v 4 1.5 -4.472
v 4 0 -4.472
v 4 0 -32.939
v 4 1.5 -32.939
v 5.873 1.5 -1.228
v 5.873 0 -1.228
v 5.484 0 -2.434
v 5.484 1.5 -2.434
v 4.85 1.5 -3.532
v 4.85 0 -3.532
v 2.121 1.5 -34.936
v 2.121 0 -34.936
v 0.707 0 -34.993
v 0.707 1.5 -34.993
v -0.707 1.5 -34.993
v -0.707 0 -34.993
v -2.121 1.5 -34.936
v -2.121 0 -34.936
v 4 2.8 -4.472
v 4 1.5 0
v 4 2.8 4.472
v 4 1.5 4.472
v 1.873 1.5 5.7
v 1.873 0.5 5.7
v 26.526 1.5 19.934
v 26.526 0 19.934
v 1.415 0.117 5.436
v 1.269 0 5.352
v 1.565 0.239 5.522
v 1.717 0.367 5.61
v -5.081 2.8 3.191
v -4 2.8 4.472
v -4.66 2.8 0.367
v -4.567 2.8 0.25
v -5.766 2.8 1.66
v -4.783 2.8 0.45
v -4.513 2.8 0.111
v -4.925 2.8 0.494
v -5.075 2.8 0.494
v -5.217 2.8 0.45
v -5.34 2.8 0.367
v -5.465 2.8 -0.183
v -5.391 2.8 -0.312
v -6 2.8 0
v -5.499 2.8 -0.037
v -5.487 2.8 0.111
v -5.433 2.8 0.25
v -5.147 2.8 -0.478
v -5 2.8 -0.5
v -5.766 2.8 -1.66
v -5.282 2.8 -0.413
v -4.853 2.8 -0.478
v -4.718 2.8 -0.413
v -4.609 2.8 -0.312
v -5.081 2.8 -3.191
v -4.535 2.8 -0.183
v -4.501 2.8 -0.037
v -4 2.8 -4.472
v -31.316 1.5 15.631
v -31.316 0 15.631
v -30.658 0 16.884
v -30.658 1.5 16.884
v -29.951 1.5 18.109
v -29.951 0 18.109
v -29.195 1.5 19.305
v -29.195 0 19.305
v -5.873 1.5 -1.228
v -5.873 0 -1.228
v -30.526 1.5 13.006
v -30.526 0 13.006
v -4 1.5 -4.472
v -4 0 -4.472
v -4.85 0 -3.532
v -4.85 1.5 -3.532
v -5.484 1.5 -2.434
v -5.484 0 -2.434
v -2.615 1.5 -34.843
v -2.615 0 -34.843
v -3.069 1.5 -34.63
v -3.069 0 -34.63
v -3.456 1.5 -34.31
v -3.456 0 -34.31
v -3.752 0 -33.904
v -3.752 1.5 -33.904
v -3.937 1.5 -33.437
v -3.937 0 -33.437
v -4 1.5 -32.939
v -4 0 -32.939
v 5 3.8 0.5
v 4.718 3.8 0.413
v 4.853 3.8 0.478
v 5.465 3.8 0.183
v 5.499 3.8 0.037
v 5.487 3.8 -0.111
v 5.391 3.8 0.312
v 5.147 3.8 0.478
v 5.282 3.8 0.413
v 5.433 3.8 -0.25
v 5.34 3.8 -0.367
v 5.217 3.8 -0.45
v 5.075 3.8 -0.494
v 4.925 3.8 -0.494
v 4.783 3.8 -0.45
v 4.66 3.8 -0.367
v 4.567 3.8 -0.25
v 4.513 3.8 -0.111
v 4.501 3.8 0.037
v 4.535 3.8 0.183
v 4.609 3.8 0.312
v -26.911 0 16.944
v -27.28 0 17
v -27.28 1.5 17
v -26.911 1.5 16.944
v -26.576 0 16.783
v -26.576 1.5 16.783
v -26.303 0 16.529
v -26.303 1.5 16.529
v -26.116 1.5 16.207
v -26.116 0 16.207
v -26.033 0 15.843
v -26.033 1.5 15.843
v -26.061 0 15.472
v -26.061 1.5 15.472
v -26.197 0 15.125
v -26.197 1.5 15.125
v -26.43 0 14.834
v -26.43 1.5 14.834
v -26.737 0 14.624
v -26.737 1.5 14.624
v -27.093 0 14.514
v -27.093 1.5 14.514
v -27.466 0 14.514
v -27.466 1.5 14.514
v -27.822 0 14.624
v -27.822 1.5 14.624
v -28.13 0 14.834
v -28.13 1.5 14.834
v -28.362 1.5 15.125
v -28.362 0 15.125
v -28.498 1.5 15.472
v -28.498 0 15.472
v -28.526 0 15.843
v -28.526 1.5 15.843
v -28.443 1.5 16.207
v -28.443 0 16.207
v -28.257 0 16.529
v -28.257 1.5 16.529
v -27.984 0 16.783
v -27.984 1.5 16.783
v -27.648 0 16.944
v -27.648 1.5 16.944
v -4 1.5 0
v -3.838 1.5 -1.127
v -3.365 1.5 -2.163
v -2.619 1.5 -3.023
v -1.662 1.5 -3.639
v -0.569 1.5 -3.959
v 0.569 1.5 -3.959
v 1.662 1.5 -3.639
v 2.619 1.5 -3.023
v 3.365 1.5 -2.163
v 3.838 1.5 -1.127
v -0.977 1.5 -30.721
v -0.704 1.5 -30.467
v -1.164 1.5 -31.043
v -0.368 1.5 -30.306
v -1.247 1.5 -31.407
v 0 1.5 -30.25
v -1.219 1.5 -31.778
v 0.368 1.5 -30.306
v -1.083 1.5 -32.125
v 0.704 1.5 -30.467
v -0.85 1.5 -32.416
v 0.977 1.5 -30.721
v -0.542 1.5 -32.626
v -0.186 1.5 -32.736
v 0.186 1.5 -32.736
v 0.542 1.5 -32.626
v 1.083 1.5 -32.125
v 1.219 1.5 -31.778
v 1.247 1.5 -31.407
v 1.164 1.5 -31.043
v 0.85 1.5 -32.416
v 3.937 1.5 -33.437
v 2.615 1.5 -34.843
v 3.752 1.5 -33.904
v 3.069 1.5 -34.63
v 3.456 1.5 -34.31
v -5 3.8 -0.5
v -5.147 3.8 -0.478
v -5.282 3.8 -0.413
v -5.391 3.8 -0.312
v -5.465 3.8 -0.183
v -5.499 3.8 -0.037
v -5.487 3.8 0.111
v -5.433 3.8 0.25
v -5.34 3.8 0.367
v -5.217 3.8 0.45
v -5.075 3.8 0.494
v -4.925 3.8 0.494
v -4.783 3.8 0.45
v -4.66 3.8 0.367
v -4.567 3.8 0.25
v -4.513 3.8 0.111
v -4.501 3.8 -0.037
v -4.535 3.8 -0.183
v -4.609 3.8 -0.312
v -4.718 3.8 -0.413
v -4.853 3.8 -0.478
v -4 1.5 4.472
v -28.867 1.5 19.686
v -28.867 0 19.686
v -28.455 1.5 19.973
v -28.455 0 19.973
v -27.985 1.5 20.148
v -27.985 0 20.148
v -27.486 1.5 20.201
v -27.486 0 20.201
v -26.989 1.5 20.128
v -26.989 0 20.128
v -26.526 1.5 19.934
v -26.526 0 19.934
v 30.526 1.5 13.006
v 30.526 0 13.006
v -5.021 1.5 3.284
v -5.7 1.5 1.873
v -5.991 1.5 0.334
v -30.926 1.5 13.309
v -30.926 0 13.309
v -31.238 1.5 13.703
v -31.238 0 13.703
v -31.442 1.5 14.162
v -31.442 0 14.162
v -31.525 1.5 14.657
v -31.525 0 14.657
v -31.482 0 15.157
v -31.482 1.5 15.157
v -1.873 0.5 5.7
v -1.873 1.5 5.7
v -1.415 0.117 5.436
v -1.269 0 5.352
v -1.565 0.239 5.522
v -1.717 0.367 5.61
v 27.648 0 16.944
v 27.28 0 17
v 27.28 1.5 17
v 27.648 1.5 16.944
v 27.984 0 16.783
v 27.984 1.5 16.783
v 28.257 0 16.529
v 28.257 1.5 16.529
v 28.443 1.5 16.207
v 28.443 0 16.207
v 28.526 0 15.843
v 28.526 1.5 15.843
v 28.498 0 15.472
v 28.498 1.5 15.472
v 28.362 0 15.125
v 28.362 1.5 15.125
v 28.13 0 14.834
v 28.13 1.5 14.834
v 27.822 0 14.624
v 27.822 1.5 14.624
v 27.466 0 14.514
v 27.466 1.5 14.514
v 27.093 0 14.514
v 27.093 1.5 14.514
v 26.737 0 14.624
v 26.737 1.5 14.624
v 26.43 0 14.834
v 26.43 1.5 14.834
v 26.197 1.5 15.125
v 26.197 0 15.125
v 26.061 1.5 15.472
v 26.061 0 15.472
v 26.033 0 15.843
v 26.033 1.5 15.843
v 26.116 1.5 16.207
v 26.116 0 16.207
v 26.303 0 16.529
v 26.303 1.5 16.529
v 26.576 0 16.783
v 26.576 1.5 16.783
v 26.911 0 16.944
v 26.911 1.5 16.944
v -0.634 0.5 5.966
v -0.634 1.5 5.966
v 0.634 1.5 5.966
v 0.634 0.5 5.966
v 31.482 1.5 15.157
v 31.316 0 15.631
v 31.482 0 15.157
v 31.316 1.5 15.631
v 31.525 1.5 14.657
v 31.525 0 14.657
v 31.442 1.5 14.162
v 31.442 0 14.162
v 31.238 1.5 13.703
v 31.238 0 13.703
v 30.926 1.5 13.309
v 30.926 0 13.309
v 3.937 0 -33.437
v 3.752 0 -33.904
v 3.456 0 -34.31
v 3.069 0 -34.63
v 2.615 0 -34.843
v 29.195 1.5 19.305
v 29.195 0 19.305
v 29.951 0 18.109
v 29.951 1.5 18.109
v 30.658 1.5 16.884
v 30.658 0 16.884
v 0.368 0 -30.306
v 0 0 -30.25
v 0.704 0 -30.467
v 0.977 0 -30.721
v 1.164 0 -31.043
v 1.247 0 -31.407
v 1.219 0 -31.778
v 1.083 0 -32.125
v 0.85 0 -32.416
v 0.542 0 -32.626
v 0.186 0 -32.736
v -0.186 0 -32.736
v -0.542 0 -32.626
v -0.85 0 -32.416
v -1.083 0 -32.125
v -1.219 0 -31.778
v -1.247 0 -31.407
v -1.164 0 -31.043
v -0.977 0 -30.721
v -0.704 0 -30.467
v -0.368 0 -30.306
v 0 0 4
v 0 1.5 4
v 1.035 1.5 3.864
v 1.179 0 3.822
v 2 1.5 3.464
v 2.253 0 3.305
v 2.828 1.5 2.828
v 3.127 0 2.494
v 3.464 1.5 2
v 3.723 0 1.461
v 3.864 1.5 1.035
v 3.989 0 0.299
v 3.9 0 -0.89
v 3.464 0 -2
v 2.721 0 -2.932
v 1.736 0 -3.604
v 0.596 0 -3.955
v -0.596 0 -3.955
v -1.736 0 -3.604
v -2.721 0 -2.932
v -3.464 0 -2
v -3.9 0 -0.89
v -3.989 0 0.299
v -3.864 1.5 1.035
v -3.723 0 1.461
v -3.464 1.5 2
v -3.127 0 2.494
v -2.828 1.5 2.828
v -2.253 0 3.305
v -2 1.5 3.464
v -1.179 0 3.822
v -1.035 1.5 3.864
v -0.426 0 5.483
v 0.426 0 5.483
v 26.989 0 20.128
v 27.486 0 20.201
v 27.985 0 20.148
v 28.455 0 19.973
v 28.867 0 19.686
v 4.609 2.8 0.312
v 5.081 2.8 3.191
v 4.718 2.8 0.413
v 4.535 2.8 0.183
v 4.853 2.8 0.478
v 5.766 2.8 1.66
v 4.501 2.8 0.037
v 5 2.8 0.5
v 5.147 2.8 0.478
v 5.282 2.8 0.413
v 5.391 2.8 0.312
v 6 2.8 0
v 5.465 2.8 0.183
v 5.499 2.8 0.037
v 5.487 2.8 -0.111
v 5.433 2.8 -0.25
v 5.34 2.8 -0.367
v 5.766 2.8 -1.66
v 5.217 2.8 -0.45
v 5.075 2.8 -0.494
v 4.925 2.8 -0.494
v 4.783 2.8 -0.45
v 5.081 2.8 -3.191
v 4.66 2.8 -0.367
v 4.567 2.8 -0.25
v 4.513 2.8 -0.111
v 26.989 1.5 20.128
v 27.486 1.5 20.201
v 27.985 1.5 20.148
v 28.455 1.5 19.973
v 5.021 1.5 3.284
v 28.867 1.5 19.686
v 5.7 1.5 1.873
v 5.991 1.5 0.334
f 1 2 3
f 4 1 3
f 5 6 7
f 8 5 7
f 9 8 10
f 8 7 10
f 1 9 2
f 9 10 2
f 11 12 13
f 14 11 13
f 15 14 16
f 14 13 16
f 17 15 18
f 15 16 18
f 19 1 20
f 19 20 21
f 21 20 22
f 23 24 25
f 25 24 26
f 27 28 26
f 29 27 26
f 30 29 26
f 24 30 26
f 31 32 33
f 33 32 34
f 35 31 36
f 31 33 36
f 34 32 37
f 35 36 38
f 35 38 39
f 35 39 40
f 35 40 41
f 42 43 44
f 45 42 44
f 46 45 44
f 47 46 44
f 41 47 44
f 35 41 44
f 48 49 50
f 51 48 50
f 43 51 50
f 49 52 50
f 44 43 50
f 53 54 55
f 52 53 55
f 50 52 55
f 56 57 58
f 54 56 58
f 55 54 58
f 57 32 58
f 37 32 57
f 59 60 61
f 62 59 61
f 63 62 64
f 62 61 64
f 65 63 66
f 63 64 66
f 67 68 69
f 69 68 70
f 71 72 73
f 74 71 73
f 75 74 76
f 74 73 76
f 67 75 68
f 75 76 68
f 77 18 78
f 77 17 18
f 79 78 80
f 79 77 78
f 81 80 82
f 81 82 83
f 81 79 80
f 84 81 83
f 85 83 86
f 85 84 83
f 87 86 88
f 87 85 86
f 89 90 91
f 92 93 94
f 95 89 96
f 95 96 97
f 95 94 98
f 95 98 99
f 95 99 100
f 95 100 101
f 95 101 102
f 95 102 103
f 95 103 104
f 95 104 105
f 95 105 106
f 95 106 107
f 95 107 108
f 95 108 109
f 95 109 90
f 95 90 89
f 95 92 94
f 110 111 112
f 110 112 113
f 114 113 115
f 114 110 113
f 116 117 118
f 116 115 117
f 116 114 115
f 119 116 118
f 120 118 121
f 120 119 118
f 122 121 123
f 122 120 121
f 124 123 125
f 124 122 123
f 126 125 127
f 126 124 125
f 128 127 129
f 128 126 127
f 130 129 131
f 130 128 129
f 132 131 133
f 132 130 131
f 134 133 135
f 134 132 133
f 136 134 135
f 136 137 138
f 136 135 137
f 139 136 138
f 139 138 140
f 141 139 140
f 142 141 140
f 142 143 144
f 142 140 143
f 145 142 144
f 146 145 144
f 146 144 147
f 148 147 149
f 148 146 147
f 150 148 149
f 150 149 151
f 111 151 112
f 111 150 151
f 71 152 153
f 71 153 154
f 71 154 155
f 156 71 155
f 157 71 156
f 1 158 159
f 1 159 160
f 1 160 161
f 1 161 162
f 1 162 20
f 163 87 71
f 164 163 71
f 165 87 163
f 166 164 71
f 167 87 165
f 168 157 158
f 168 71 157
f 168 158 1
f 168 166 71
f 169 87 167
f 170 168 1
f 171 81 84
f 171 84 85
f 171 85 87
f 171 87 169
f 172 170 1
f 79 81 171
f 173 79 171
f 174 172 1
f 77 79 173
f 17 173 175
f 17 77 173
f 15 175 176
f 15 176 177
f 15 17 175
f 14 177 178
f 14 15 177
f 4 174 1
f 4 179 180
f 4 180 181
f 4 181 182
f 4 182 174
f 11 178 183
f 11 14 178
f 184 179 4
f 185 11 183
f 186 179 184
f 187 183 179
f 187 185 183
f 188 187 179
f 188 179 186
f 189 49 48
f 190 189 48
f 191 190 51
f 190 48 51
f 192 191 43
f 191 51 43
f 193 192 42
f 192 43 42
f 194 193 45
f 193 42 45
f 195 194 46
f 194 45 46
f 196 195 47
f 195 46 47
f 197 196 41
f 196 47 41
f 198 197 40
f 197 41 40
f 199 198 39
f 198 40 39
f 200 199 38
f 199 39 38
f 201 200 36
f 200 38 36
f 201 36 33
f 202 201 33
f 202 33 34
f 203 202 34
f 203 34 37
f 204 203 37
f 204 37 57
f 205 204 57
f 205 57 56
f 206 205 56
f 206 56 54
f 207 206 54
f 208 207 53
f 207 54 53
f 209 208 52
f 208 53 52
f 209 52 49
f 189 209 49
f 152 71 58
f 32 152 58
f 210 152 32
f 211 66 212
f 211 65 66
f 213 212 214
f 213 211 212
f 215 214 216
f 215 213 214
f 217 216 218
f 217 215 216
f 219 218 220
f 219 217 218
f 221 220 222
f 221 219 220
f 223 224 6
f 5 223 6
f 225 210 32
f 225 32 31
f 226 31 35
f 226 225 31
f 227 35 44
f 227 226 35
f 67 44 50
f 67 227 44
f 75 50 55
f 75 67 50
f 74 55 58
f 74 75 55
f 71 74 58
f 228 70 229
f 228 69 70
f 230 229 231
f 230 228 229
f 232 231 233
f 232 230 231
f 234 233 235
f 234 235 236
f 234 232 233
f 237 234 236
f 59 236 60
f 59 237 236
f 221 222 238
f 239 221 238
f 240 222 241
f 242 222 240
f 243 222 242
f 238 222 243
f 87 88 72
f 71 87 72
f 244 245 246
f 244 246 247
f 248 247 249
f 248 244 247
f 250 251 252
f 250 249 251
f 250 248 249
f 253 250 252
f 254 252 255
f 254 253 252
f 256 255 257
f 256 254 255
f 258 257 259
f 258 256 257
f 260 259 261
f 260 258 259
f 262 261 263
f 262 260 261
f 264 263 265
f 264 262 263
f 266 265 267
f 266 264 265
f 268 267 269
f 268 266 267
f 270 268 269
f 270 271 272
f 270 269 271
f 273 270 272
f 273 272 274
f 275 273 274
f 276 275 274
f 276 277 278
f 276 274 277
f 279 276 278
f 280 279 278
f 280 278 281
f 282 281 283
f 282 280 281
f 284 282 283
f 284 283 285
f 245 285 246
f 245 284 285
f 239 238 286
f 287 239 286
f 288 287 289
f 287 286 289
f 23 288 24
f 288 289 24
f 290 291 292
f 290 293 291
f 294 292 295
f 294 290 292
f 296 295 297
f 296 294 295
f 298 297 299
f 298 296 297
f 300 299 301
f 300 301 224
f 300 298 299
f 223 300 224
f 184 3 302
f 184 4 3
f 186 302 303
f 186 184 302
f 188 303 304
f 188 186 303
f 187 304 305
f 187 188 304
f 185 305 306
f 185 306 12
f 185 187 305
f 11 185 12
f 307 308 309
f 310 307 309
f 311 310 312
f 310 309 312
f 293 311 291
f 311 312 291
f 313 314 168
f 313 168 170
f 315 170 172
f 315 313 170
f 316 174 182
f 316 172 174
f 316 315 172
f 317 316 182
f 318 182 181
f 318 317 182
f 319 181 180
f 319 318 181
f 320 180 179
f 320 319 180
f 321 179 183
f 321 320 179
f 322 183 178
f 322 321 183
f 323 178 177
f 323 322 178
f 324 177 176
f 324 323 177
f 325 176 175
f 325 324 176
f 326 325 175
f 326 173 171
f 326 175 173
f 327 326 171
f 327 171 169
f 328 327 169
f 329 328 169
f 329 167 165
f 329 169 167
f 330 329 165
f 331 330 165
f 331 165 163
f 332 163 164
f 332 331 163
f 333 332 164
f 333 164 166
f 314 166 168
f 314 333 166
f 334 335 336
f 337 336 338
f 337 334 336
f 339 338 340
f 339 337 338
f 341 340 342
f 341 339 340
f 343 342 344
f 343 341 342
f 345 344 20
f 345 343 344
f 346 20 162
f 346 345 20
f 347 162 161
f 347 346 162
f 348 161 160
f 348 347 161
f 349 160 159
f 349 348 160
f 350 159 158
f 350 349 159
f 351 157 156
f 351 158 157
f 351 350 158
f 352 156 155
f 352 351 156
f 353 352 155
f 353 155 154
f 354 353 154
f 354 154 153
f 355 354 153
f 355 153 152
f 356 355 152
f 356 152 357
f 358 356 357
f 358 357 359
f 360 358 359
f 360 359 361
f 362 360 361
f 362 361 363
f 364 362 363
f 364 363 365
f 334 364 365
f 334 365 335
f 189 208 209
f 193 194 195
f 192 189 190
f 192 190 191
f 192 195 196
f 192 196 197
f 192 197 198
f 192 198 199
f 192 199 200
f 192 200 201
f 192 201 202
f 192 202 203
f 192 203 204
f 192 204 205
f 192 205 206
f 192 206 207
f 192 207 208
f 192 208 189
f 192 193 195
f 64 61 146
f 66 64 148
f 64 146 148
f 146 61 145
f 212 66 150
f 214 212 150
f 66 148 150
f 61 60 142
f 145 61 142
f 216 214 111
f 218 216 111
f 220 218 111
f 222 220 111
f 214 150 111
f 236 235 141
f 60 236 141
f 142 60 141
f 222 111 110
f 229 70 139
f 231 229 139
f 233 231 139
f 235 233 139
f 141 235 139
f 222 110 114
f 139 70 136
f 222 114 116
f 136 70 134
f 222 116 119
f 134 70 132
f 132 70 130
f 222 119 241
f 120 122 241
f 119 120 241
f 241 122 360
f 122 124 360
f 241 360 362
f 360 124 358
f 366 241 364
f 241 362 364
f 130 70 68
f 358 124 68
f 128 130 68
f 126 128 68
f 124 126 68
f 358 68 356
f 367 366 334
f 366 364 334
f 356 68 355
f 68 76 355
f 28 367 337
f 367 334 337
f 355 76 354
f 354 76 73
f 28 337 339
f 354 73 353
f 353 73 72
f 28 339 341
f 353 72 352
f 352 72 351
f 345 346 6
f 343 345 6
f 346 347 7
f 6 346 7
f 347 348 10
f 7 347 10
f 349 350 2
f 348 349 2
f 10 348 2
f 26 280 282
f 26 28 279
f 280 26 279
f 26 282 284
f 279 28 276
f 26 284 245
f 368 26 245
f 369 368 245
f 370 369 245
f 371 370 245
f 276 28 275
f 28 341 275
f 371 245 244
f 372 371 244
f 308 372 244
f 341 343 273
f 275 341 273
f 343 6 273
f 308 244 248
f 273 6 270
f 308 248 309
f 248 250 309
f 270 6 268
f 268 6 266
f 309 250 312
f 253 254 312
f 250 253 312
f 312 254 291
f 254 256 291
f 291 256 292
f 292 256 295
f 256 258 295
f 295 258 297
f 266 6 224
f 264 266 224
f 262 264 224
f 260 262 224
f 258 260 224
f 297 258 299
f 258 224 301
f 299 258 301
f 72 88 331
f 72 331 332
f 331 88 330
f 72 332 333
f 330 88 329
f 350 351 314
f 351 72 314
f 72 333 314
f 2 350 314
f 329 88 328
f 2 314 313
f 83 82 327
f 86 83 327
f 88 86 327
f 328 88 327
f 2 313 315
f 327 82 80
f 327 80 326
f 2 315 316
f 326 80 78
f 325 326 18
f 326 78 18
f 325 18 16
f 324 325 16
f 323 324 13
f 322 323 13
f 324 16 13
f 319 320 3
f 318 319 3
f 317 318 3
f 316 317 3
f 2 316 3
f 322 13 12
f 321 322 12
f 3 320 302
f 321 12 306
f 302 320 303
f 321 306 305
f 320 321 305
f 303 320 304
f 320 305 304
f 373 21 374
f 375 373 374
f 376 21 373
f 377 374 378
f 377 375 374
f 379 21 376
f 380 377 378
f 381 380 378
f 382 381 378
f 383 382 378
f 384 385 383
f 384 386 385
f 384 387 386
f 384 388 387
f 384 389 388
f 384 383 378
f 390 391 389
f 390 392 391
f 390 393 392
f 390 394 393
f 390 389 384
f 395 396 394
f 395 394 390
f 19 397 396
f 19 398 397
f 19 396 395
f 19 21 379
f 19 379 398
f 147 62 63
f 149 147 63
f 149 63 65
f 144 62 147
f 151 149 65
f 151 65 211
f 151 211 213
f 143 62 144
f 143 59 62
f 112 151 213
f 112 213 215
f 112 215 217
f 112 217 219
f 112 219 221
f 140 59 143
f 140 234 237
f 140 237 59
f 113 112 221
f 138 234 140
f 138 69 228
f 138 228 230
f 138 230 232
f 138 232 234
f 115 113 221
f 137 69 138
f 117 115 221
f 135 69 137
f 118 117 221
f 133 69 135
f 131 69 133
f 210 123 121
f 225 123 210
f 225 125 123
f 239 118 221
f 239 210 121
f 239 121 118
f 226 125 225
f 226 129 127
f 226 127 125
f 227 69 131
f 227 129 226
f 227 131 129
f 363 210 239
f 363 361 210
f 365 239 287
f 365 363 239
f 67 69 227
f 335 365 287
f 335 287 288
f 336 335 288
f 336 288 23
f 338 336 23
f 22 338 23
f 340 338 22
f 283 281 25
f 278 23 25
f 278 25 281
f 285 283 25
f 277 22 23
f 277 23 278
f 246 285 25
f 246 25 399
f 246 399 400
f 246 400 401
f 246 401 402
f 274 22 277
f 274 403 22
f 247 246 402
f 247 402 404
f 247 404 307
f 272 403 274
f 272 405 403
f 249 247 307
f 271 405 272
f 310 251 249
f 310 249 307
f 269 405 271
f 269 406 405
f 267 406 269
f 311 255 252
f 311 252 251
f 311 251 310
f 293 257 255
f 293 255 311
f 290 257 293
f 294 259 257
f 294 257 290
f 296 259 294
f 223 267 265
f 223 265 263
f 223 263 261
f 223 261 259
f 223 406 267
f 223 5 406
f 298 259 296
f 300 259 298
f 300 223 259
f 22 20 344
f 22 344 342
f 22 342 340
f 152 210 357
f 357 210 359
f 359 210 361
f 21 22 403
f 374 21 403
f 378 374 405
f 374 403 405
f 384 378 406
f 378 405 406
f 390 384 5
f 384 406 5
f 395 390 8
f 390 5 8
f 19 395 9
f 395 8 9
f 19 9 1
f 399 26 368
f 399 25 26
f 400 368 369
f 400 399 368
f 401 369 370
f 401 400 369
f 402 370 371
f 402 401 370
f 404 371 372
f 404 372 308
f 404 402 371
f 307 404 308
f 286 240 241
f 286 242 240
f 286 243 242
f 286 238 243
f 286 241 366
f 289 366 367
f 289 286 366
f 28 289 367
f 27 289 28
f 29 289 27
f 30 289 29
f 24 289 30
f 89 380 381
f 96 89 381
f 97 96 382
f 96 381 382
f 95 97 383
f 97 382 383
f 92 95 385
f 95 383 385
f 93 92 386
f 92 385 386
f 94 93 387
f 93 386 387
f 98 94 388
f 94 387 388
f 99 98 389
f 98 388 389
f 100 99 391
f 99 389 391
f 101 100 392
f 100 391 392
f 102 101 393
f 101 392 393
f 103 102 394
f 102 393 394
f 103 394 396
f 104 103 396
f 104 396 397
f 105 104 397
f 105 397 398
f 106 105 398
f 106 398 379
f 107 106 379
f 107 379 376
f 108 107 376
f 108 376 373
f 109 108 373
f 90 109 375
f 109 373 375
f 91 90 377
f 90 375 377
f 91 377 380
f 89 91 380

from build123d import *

# Parameters (mm, degrees)
EXTRUDE_1_DEPTH          = 1.5
FILLET_1_R               = 2
CUT_EXTRUDE_1_DEPTH      = 48.129161057
CUT_EXTRUDE_1_DEPTH_BACK = 48.129161057
SKETCH_2_R               = 1.25
EXTRUDE_2_DEPTH          = 1.3
SKETCH_5_R               = 0.5
EXTRUDE_3_DEPTH          = 1
CUT_EXTRUDE_2_DEPTH      = 48.161401823
CUT_EXTRUDE_2_DEPTH_BACK = 48.161401823
SKETCH_6_R               = 4
CHAMFER_1_SIZE           = 0.5


with BuildPart() as part:
    # 草图1 → 凸台-拉伸1 (new body)
    with BuildSketch(Plane(origin=(0, 0, 0), x_dir=(1, 0, 0), z_dir=(0, 1, 0))):
        with BuildLine():
            Line((4, 4.472135955), (4, 34.770677301))
            ThreePointArc((4, 34.770677301), (0, 35), (-4, 34.770677301))
            Line((-4, 34.770677301), (-4, 4.472135955))
            ThreePointArc((-4, 4.472135955), (-5.196152423, 3), (-5.872983346, 1.228033638))
            Line((-5.872983346, 1.228033638), (-32.11228985, -13.921237036))
            ThreePointArc((-32.11228985, -13.921237036), (-30.310889132, -17.5), (-28.11228985, -20.849440266))
            Line((-28.11228985, -20.849440266), (-1.872983346, -5.700169593))
            ThreePointArc((-1.872983346, -5.700169593), (0, -6), (1.872983346, -5.700169593))
            Line((1.872983346, -5.700169593), (28.11228985, -20.849440266))
            ThreePointArc((28.11228985, -20.849440266), (30.310889132, -17.5), (32.11228985, -13.921237036))
            Line((32.11228985, -13.921237036), (5.872983346, 1.228033638))
            ThreePointArc((5.872983346, 1.228033638), (5.196152423, 3), (4, 4.472135955))
        make_face()
    extrude(amount=EXTRUDE_1_DEPTH)

    # 圆角1
    fillet_1_edges = [part.edges().sort_by_distance(p)[0] for p in [
        (32.11228985, 0.75, 13.921237036),
        (28.11228985, 0.75, 20.849440266),
        (-28.11228985, 0.75, 20.849440266),
        (-32.11228985, 0.75, 13.921237036),
        (-4, 0.75, -34.770677301),
        (4, 0.75, -34.770677301),
    ]]
    fillet(fillet_1_edges, radius=FILLET_1_R)

    # 草图2 → 切除-拉伸1 (cut, two sides: drawn at the far end of the back side and taken through both)
    with BuildSketch(Plane(origin=(0, 1.5, 0), x_dir=(1, 0, 0), z_dir=(0, 1, 0)).offset(-CUT_EXTRUDE_1_DEPTH_BACK)):
        with Locations(Location((0, 31.5, 0), (0, 0, 270))):
            Circle(SKETCH_2_R)
        with Locations(Location((27.279800219, -15.75, 0), (0, 0, 270))):
            Circle(SKETCH_2_R)
        with Locations(Location((-27.279800219, -15.75, 0), (0, 0, 270))):
            Circle(SKETCH_2_R)
    extrude(amount=CUT_EXTRUDE_1_DEPTH + CUT_EXTRUDE_1_DEPTH_BACK, mode=Mode.SUBTRACT)

    # 草图4 → 凸台-拉伸2 (add)
    with BuildSketch(Plane(origin=(0, 1.5, 0), x_dir=(1, 0, 0), z_dir=(0, 1, 0))):
        with BuildLine():
            Line((-4, 4.472135955), (-4, -4.472135955))
            ThreePointArc((-4, -4.472135955), (-6, 0), (-4, 4.472135955))
        make_face()
        with BuildLine():
            Line((4, 4.472135955), (4, -4.472135955))
            ThreePointArc((4, -4.472135955), (6, 0), (4, 4.472135955))
        make_face()
    extrude(amount=EXTRUDE_2_DEPTH)

    # 草图5 → 凸台-拉伸3 (add)
    with BuildSketch(Plane(origin=(0, 2.8, 0), x_dir=(1, 0, 0), z_dir=(0, 1, 0))):
        with Locations(Location((5, 0, 0), (0, 0, 270))):
            Circle(SKETCH_5_R)
        with Locations(Location((-5, 0, 0), (0, 0, 90))):
            Circle(SKETCH_5_R)
    extrude(amount=EXTRUDE_3_DEPTH)

    # 草图6 → 切除-拉伸2 (cut, two sides: drawn at the far end of the back side and taken through both)
    with BuildSketch(Plane(origin=(0, 1.5, 0), x_dir=(1, 0, 0), z_dir=(0, 1, 0)).offset(-CUT_EXTRUDE_2_DEPTH_BACK)):
        with Locations(Location((0, 0, 0), (0, 0, 270))):
            Circle(SKETCH_6_R)
    extrude(amount=CUT_EXTRUDE_2_DEPTH + CUT_EXTRUDE_2_DEPTH_BACK, mode=Mode.SUBTRACT)

    # 倒角1
    chamfer_1_edges = [part.edges().sort_by_distance(p)[0] for p in [
        (0, 0, 6),
    ]]
    chamfer(chamfer_1_edges, length=CHAMFER_1_SIZE)


solid = part.part
